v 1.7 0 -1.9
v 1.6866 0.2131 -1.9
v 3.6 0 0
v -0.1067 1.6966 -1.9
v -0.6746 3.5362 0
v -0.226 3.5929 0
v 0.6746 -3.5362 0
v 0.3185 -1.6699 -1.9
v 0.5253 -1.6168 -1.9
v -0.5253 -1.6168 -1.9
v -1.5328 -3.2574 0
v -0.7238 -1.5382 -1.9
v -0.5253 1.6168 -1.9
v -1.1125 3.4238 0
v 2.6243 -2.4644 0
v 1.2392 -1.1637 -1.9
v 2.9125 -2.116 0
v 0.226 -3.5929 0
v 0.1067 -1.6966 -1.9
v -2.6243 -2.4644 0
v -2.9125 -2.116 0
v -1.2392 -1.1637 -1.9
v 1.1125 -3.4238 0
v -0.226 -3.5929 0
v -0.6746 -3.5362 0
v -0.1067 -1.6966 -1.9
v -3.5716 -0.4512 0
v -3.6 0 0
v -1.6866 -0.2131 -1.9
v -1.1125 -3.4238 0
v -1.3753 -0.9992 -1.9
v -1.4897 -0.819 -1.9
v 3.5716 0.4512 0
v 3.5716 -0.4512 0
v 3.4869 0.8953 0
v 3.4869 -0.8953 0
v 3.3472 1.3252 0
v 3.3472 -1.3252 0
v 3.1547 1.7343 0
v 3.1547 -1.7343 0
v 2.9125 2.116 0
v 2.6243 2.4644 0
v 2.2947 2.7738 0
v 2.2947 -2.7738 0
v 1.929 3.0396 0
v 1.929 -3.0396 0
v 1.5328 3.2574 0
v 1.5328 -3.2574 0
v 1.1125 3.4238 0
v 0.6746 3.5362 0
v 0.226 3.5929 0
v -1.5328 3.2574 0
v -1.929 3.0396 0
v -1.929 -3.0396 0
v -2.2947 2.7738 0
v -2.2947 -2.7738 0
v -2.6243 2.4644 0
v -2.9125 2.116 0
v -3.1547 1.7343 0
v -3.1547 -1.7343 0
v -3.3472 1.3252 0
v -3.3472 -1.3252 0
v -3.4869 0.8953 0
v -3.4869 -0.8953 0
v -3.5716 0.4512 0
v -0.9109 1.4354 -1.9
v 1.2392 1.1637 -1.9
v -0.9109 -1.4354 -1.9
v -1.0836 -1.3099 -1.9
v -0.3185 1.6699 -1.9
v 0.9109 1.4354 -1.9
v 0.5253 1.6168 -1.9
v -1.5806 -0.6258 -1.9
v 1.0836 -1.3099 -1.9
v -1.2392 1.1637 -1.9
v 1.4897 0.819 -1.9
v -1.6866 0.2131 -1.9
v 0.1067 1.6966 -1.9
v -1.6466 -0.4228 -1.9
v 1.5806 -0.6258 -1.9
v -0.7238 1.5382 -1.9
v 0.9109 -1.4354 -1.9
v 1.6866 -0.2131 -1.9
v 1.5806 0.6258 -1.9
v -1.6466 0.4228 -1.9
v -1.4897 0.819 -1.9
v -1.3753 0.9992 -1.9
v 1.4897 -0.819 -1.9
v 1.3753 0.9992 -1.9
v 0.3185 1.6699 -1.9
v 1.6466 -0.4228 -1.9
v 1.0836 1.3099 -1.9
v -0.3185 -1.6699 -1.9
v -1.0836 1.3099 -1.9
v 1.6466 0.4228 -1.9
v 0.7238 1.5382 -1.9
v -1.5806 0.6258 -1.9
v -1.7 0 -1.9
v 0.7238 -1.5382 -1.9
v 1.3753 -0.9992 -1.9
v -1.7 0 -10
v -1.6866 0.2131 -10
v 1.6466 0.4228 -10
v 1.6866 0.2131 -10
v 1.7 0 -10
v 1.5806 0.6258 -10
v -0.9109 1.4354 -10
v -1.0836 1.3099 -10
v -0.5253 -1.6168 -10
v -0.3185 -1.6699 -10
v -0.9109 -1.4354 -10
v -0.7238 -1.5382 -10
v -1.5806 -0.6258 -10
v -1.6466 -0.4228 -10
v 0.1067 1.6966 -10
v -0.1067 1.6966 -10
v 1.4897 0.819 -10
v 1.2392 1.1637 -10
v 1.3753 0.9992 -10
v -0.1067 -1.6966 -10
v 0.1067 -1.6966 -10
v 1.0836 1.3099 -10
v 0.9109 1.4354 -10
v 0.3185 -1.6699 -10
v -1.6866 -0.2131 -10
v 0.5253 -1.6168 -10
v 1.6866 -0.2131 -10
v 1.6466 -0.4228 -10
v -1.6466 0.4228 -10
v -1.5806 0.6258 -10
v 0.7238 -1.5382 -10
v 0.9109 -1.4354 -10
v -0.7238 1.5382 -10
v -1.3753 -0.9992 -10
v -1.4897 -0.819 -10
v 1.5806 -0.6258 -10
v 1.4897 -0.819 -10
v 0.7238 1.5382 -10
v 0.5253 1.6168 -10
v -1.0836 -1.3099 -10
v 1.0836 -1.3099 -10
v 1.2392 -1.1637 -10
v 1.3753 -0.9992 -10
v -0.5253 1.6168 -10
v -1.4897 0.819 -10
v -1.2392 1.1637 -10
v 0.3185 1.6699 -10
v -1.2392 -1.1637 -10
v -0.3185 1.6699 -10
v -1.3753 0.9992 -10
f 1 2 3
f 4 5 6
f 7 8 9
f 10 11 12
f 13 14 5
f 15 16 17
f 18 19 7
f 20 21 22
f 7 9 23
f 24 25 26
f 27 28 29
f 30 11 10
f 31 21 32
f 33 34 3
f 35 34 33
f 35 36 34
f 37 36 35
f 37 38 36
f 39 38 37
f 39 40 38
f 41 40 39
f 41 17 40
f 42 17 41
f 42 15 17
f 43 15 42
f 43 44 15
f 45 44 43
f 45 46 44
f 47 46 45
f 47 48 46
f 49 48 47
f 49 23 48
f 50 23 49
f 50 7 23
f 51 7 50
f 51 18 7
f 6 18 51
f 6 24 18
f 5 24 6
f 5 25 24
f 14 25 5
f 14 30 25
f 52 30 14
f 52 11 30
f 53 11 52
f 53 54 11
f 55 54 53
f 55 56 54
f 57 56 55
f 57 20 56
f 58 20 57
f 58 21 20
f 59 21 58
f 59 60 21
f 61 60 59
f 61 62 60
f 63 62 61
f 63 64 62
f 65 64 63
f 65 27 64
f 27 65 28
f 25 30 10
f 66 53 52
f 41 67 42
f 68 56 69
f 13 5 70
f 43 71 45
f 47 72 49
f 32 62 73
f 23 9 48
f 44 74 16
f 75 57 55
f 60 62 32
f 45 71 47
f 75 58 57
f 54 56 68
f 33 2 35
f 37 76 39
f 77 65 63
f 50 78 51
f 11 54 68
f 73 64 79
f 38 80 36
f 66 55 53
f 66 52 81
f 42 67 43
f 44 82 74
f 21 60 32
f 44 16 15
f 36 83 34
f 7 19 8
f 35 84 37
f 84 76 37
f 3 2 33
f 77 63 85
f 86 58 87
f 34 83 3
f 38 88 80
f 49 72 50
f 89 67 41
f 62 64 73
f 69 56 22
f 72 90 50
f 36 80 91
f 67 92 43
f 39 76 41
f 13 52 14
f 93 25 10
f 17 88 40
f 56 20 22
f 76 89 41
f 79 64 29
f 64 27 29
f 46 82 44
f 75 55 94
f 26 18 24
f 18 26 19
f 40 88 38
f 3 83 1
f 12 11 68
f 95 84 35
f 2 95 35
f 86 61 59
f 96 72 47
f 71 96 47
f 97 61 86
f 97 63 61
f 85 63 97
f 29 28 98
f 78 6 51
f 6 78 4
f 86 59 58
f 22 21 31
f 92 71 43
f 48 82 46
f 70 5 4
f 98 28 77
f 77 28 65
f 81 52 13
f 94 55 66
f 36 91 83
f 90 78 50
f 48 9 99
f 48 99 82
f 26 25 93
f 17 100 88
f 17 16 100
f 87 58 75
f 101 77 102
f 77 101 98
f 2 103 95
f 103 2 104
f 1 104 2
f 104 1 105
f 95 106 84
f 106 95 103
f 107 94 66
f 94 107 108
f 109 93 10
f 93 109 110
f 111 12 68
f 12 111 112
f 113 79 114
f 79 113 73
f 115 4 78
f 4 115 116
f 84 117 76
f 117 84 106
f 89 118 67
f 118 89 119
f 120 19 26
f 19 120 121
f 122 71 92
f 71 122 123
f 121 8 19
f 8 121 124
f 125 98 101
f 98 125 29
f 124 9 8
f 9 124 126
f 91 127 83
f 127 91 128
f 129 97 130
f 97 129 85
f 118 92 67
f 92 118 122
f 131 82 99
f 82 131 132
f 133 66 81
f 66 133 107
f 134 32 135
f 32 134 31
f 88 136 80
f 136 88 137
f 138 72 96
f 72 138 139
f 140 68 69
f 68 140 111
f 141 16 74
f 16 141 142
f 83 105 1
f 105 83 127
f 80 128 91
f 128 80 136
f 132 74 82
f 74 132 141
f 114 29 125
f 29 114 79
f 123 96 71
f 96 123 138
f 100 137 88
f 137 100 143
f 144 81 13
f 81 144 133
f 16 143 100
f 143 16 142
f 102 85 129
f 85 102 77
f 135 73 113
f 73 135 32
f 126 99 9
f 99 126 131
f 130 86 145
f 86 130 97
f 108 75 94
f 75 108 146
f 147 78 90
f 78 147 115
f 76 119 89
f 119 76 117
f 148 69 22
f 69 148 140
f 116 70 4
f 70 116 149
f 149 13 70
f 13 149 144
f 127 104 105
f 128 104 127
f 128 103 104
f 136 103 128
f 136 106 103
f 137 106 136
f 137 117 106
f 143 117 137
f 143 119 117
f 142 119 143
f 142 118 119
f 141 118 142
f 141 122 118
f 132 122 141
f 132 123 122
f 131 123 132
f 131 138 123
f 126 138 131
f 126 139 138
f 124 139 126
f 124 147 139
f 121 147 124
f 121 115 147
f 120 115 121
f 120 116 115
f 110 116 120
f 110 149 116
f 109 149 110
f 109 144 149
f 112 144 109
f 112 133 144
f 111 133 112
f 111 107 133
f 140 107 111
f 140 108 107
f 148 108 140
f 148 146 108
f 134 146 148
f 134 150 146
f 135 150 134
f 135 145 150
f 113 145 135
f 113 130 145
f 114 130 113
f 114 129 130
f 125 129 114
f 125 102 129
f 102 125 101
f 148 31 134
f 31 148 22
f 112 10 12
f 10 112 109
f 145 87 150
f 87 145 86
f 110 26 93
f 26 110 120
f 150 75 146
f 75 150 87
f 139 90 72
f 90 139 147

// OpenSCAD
// Generated by SolidPython 1.1.3 on 2023-03-13 21:43:02
$fn = 50;


difference() {
	union() {
		translate(v = [0, 0, -1.9000000000]) {
			rotate(a = [0, 0, 0]) {
				cylinder(h = 1.9000000000, r1 = 1.7000000000, r2 = 3.6000000000);
			}
		}
		translate(v = [0, 0, -10]) {
			rotate(a = [0, 0, 0]) {
				cylinder(h = 10, r = 1.7000000000);
			}
		}
	}
	union();
}
/***********************************************
*********      SolidPython code:      **********
************************************************
 
from solid import *
import os
import subprocess

import oomB

import opsc_library_gen

mode = "laser"
#mode = "3d_print"

defined_objects = {}

radius_dict = {}
countersunk_dict = {}


def set_mode(m):
    global mode
    mode = m
    radius_dict['M6'] = 6.5/2
    radius_dict['M3'] = 3.3/2
    if mode == "laser":
        radius_dict['M6'] = 6/2
        radius_dict['M3'] = 3/2

    countersunk_dict['M3'] = {}
    countersunk_dict['M3']['little_rad'] = radius_dict['M3']
    countersunk_dict['M3']['big_rad'] = (5.5+0.6)/2
    if mode == "laser":
        countersunk_dict['M3']['big_rad'] = (4.75+0.6)/2
        countersunk_dict['M3']['little_rad'] = (4.75+0.6)/2

    countersunk_dict['M3']['height'] = 1.7


def opsc_make_object(filename, objects, save_type="none",resolution=50, layers = 1, tilediff = 200, mode="laser", overwrite=True):
    if overwrite or not os.path.exists(filename):
        set_mode(mode)
        save_type = save_type.lower()
        os.makedirs(os.path.dirname(filename), exist_ok=True)
        final_object = opsc_get_object(objects, mode = mode)
        # Save the final object to the specified filename    
        scad_render_to_file(final_object, filename, file_header='$fn = %s;' % resolution, include_orig_code=True)
        if save_type == "all":
            saveToAll(filename)
        elif save_type == "dxf":
            saveToDxf(filename)
        if mode == "laser":
            filename_laser = filename.replace(".scad","-flat.scad")
            scad_render_to_file(getLaser(final_object, layers=layers, tilediff=tilediff), filename_laser, file_header='$fn = %s;' % resolution, include_orig_code=True)
            if save_type == "all":
                saveToAll(filename_laser)
            elif save_type == "dxf":
                saveToDxf(filename_laser)


def opsc_get_object(objects, mode = "laser"):
    # Create the solidpython objects only include the positive objects and if they don't have inclusion or their inclusion is either all or mode
    # Initialize an empty list to store the results
    positive_objects = []

    # Iterate over the "objects" list
    for obj in objects:
        # Check if the current object has a "type" key with a value of "positive"
        if obj['type'] == 'positive':
            # Check if the current object has an "inclusion" key and its value matches "mode",
            # or if the current object does not have an "inclusion" key at all
            if not 'inclusion' in obj or obj['inclusion'] == "all" or obj['inclusion'] == mode:
                # Call the "get_opsc_item" function with the current object as an argument
                opsc_item = get_opsc_item(obj)
                # Add the result to the "positive_objects" list
                positive_objects.append(opsc_item)
# Initialize an empty list to store the results
    negative_objects = []

    # Iterate over the "objects" list
    for obj in objects:
        # Check if the current object has a "type" key with a value of "negative"
        if obj['type'] == 'negative':
            # Check if the current object has an "inclusion" key and its value matches "mode",
            # or if the current object does not have an "inclusion" key at all
            if not 'inclusion' in obj or obj['inclusion'] == "all" or obj['inclusion'] == mode:
                # Call the "get_opsc_item" function with the current object as an argument
                opsc_item = get_opsc_item(obj)
                # Add the result to the "negative_objects" list
                negative_objects.append(opsc_item)
    
    #positive_objects = [get_opsc_item(obj) for obj in objects if obj['type'] == 'positive']
    #negative_objects = [get_opsc_item(obj) for obj in objects if obj['type'] == 'negative']
    # Union the positive objects
    positive_object = union()(*positive_objects)
    # Union the negative objects
    negative_object = union()(*negative_objects)
    # Create the final object by subtracting the negative objects from the positive objects
    return difference()(positive_object, negative_object)

def get_opsc_item(params):
    # A dictionary to map radius string values to numerical values
    #radius_dict = {'small': 5, 'medium': 10, 'large': 15}
    # An array of function names for basic shapes
    basic_shapes = ['cube', 'sphere', 'cylinder']
    
    # An array of function names for other shapes
    other_shapes = ['hole', 'slot', 'rounded_rectangle', 'countersunk', 'polyg']
    


    # Convert radius to r if present, and remove radius from the params dictionary
    if 'radius' in params:
        if isinstance(params['radius'], str):
            # Use the radius_dict to map the radius string value to a numerical value
            params['r'] = radius_dict[params['radius']]
        else:
            params['r'] = params['radius']
        del params['radius']
    

    # Check if the object type is a basic shape
    if params['shape'] in basic_shapes:
        # Remove shape and unexpected dictionary values
        allowed_keys = {'size', 'r', 'r1', 'r2', 'd', 'h', 'rw', 'rh', 'dw', 'dh'}
        shape_params = {k: v for k, v in params.items() if k in allowed_keys}

        #params['m'] = "#"
        ###split for adding modifier
        try:
            m = params['m']
            func = globals()[params['shape']]
            return_value = get_opsc_transform(params,func(**shape_params))
            return_value = (return_value).set_modifier(m)
            return return_value
        except KeyError as e:
            return get_opsc_transform(params,globals()[params['shape']](**shape_params))
        
    elif params['shape'] == 'polygon':
        # Remove shape and unexpected dictionary values
        h  = params['height']
        allowed_keys = {'points'}
        shape_params = {k: v for k, v in params.items() if k in allowed_keys}

        # Call the corresponding function for the shape parameter, using ** notation to pass the shape_params dictionary as keyword arguments
        params["rot"] = [0,0,0]        
        try:
            m = params['m']
            func = globals()[params['shape']]
            return_value = get_opsc_transform(params,linear_extrude(h)(globals()[params['shape']](**shape_params)))
            return_value = (return_value).set_modifier(m)
            return return_value
        except KeyError as e:
            return_value = get_opsc_transform(params,linear_extrude(h)(globals()[params['shape']](**shape_params)))
            return_value = (return_value)
            return return_value


    # If the object type is not a basic shape, check if it's a defined object or one of the other shapes
    elif params['shape'] in other_shapes:
        # Call the corresponding function for the shape parameter, passing the params dictionary as an argument
        p2 = copy.deepcopy(params)
        p2["pos"] = [0,0,0]
        return get_opsc_transform(params,globals()[params['shape']](p2))
    
    # If the object is not a basic shape or a defined object, try to import it from a .scad file
    else:
        obj = defined_objects[params['shape']]
        return get_opsc_transform(params,obj)

def get_opsc_transform(params, solid_obj):
    # Rotate the object based on the 'rot' field in the params dictionary, or the 'rotX', 'rotY', and 'rotZ' fields if 'rot' is not present
    rot = params.get('rot', [])
    if rot:
        rotX, rotY, rotZ = rot
    else:
        rotX = params.get('rotX', 0)
        rotY = params.get('rotY', 0)
        rotZ = params.get('rotZ', 0)
    solid_obj = rotate([rotX, rotY, rotZ])(solid_obj)

    # Translate the object based on the 'pos' field in the params dictionary, or the 'x', 'y', and 'z' fields if 'pos' is not present
    pos = params.get('pos', [])
    if pos:
        x, y, z = pos
    else:
        x = params.get('x', 0)
        y = params.get('y', 0)
        z = params.get('z', 0)
    solid_obj = translate([x, y, z])(solid_obj)
    return solid_obj


import random

def opsc_easy_array(type, shape, repeats, pos_start, shift_arr, **kwargs):
    for i in range(0,3):
        repeats.append(1)
        pos_start.append(0)
        shift_arr.append(0)
    return_objects = []

    for x in range(0,repeats[0]):
        for y in range(0,repeats[1]):
            for z in range(0,repeats[2]):
                return_objects.append(opsc_easy(type, shape, pos=[pos_start[0]+x*shift_arr[0],pos_start[1]+y*shift_arr[1],pos_start[2]+z*shift_arr[2]], **kwargs))
    return return_objects                



def opsc_easy(type, shape, **kwargs):
    obj = {
        'type': type,
        'shape': shape
    }
    for param in ['size', 'r', 'r1', 'r2', 'd', 'h', 'rw', 'rh', 'dw', 'dh', 'pos', 'x', 'y', 'z', 'rot', 'rotX', 'rotY', 'rotZ', "w", "inclusion", 'sides', 'height', "m"]:
        if param in kwargs:
            obj[param] = kwargs[param]
    return obj

def hole(params):
    p2 = copy.deepcopy(params)  
    # Check if the radius is a string and replace it with the corresponding value from the dictionary
    if isinstance(p2['r'], str):
        p2['r'] = radius_dict[p2['r']]
    
    # Set the height to 100 if not specified
    if 'h' not in p2:
        p2['h'] = 100
        p2["pos"] = [0,0,-50]
    p2["center"] = True
    # Create the cylinder object
    p2["shape"] = "cylinder"
    p2["type"] = "positive"

    return get_opsc_item(p2)

import copy

def countersunk(params):
    p2 = copy.deepcopy(params)
    counter_rad = p2['r']
    p2['r'] = radius_dict[p2['r']]
    hp = copy.deepcopy(p2)
    hp["type"] = "positive"
    hp["shape"] = "hole"
    del hp["rot"]
    hol = get_opsc_item(hp)
    
    cp = copy.deepcopy(p2)
    cp["h"] = countersunk_dict[counter_rad]["height"]
    cp["r2"] = countersunk_dict[counter_rad]["little_rad"]
    cp["r1"] = countersunk_dict[counter_rad]["big_rad"]
    del cp["r"]
    del cp["rot"]
    cp["type"] = "positive"
    cp["shape"] = "cylinder"
    cp["pos"] = [0,0,0]

    top = get_opsc_item(cp)
    return union()(hol,top)



def slot(params):  
    p2 = copy.deepcopy(params) 
    if isinstance(p2['r'], str):
        p2['r'] = radius_dict[p2['r']]
    p2["type"] = "positive"
    p2["shape"] = "hole"
    del p2["rot"]
    p2["pos"] = [0,0,0]
    left = copy.deepcopy(p2)
    right = copy.deepcopy(p2)
    left["pos"][0] = p2["w"] / 2 - p2["r"] 
    
    right["pos"][0] = -p2["w"] / 2 + p2["r"] 
    pass
    leftObj = get_opsc_item(left)
    rightObj = get_opsc_item(right)
    return hull()(leftObj, rightObj)

def rounded_rectangle(params):   
    p2 = copy.deepcopy(params) 
    p2["h"] = p2["size"][2]
    p2["pos"] = p2.get("pos", [0, 0, 0]) 
    p2["type"] = "positive"
    p2["shape"] = "hole"
    p2["pos"] = [0,0,0]
    
    if 'rot' in p2:
        del p2["rot"]   
    if 'r' not in p2:
        p2["r"] = 5 
    tl = copy.deepcopy(p2)
    tr = copy.deepcopy(p2)
    bl = copy.deepcopy(p2)
    br = copy.deepcopy(p2)
    tl["pos"][0] = -(p2["size"][0] - p2["r"]*2)/2
    tl["pos"][1] = (p2["size"][1] - p2["r"]*2)/2
    tr["pos"][0] = (p2["size"][0] - p2["r"]*2)/2
    tr["pos"][1] = (p2["size"][1] - p2["r"]*2)/2
    bl["pos"][0] = -(p2["size"][0] - p2["r"]*2)/2
    bl["pos"][1] = -(p2["size"][1] - p2["r"]*2)/2
    br["pos"][0] = (p2["size"][0] - p2["r"]*2)/2
    br["pos"][1] = -(p2["size"][1] - p2["r"]*2)/2
    del tl["size"]
    del tr["size"]
    del bl["size"]
    del br["size"]
    tlo = get_opsc_item(tl)
    tro = get_opsc_item(tr)
    blo = get_opsc_item(bl)
    bro = get_opsc_item(br)    
    return hull()(tlo, tro, blo, bro)



def polyg(params):
    p2 = copy.deepcopy(params) 
    p2["type"] = "positive"
    p2["shape"] = "polygon"
    p2["pos"] = [0,0,0]
    sides = p2["sides"]
    radius = p2["r"]    
    angles = [i * 360 / sides for i in range(sides)]
    points = regular_polygon(sides, radius)
    
    p2["points"] = points
    return get_opsc_item(p2)

import math

def regular_polygon(num_sides, radius):
    # Calculate the angle between each side
    angle = 2 * math.pi / num_sides

    # Calculate the points of the polygon
    points = []
    for i in range(num_sides):
        x = radius * math.cos(i * angle)
        y = radius * math.sin(i * angle)
        points.append((x, y))
    return points

def import_scad_object(filename):
    # Import the .scad file and convert it to a solidpython object
    #filename = "parts"
    obj = import_scad(filename)
    return obj.main()



import os
import solid as solidpython

# A dictionary to store the defined objects


def load_scad_objects():
    opsc_library_gen.gen_library(defined_objects)

import random

def test(num_objects):
    objects = []
    for i in range(num_objects):
        # Choose a random shape
        #shape = random.choice(['cube', 'sphere', 'cylinder', 'hole', 'slot', "rounded_rectangle"])
        shape = random.choice(["rounded_rectangle"])

        # Choose a random type
        type = random.choice(['positive', 'negative'])
        
        # Create an empty object dictionary
        obj = {'shape': shape, 'type': type}
        
        # Set shape-specific parameters
        if obj['shape'] in ['cube']:
            obj['size'] =  [random.uniform(5, 15), random.uniform(5, 15), random.uniform(5, 15)]
        if obj['shape'] in ['rounded_rectangle']:
            obj['size'] =  [random.uniform(5, 15), random.uniform(5, 15), random.uniform(5, 15)]
            obj['r'] = random.uniform(0.5, 5)
        elif obj['shape'] == 'sphere':
            obj['r'] = random.uniform(5, 15)
        elif obj['shape'] in ['cylinder', 'hole']:
            obj['r'] = random.uniform(0.5, 5)
            obj['h'] = random.uniform(5, 15)
        elif obj['shape'] == 'slot':
            obj['r'] = random.uniform(0.5, 5)
            obj['h'] = random.uniform(5, 15)
            obj['w'] = random.uniform(5, 15)
        
        # Set a random position and rotation
        obj['pos'] = [random.uniform(-20, 20), random.uniform(-20, 20), random.uniform(-20, 20)]
        obj['rot'] = [random.uniform(-180, 180), random.uniform(-180, 180), random.uniform(-180, 180)]
        
        # Add the object to the list
        objects.append(obj)
    return objects

####### old file saving
def saveToAll(fileIn):
    saveToStl(fileIn)
    saveToDxf(fileIn)
    saveToPng(fileIn)
    saveToSvg(fileIn)

def saveToDxf(fileIn, fileOut="", copy_to_laser=True):
    if fileOut == "":
        fileOut = fileIn.replace(".scad",".dxf")
    saveToFile(fileIn, fileOut)


    
def saveToPng(fileIn, fileOut="",extra="--render"):
    if fileOut == "":
        fileOut = fileIn.replace(".scad",".png")
    saveToFile(fileIn, fileOut)

def saveToStl(fileIn, fileOut=""):
    if fileOut == "":
        fileOut = fileIn.replace(".scad",".stl")
    saveToFile(fileIn, fileOut)
    
def saveToSvg(fileIn, fileOut=""):
    if fileOut == "":
        fileOut = fileIn.replace(".scad",".svg")
    saveToFile(fileIn, fileOut)

def saveToFile(fileIn, fileOut,extra=""):
    #extra = extra + " --colorscheme Tomorrow"

    launchStr = 'openscad -o "' + fileOut + '"' + extra + ' "' + fileIn + '"'
    if ".png" in fileOut:
        launchStr = launchStr + " --render"
    print("            saveToFile launch string: " + launchStr)
    subprocess.run(launchStr)
    x=0

def getLaser(final_object,start=1.5,layers=1,thickness=3,tilediff=200):
        rv= []

        for x in range(layers):
            rv.append(translate([0,x*tilediff,0])(
                    projection()(
                        intersection()(translate([-500,-500,start+x*thickness])(cube(size=[1000,1000,0.1])),
                            final_object
                        )
                    )
            )
            )
            
        return union()(rv)

set_mode("laser")
load_scad_objects() 
 
************************************************/
